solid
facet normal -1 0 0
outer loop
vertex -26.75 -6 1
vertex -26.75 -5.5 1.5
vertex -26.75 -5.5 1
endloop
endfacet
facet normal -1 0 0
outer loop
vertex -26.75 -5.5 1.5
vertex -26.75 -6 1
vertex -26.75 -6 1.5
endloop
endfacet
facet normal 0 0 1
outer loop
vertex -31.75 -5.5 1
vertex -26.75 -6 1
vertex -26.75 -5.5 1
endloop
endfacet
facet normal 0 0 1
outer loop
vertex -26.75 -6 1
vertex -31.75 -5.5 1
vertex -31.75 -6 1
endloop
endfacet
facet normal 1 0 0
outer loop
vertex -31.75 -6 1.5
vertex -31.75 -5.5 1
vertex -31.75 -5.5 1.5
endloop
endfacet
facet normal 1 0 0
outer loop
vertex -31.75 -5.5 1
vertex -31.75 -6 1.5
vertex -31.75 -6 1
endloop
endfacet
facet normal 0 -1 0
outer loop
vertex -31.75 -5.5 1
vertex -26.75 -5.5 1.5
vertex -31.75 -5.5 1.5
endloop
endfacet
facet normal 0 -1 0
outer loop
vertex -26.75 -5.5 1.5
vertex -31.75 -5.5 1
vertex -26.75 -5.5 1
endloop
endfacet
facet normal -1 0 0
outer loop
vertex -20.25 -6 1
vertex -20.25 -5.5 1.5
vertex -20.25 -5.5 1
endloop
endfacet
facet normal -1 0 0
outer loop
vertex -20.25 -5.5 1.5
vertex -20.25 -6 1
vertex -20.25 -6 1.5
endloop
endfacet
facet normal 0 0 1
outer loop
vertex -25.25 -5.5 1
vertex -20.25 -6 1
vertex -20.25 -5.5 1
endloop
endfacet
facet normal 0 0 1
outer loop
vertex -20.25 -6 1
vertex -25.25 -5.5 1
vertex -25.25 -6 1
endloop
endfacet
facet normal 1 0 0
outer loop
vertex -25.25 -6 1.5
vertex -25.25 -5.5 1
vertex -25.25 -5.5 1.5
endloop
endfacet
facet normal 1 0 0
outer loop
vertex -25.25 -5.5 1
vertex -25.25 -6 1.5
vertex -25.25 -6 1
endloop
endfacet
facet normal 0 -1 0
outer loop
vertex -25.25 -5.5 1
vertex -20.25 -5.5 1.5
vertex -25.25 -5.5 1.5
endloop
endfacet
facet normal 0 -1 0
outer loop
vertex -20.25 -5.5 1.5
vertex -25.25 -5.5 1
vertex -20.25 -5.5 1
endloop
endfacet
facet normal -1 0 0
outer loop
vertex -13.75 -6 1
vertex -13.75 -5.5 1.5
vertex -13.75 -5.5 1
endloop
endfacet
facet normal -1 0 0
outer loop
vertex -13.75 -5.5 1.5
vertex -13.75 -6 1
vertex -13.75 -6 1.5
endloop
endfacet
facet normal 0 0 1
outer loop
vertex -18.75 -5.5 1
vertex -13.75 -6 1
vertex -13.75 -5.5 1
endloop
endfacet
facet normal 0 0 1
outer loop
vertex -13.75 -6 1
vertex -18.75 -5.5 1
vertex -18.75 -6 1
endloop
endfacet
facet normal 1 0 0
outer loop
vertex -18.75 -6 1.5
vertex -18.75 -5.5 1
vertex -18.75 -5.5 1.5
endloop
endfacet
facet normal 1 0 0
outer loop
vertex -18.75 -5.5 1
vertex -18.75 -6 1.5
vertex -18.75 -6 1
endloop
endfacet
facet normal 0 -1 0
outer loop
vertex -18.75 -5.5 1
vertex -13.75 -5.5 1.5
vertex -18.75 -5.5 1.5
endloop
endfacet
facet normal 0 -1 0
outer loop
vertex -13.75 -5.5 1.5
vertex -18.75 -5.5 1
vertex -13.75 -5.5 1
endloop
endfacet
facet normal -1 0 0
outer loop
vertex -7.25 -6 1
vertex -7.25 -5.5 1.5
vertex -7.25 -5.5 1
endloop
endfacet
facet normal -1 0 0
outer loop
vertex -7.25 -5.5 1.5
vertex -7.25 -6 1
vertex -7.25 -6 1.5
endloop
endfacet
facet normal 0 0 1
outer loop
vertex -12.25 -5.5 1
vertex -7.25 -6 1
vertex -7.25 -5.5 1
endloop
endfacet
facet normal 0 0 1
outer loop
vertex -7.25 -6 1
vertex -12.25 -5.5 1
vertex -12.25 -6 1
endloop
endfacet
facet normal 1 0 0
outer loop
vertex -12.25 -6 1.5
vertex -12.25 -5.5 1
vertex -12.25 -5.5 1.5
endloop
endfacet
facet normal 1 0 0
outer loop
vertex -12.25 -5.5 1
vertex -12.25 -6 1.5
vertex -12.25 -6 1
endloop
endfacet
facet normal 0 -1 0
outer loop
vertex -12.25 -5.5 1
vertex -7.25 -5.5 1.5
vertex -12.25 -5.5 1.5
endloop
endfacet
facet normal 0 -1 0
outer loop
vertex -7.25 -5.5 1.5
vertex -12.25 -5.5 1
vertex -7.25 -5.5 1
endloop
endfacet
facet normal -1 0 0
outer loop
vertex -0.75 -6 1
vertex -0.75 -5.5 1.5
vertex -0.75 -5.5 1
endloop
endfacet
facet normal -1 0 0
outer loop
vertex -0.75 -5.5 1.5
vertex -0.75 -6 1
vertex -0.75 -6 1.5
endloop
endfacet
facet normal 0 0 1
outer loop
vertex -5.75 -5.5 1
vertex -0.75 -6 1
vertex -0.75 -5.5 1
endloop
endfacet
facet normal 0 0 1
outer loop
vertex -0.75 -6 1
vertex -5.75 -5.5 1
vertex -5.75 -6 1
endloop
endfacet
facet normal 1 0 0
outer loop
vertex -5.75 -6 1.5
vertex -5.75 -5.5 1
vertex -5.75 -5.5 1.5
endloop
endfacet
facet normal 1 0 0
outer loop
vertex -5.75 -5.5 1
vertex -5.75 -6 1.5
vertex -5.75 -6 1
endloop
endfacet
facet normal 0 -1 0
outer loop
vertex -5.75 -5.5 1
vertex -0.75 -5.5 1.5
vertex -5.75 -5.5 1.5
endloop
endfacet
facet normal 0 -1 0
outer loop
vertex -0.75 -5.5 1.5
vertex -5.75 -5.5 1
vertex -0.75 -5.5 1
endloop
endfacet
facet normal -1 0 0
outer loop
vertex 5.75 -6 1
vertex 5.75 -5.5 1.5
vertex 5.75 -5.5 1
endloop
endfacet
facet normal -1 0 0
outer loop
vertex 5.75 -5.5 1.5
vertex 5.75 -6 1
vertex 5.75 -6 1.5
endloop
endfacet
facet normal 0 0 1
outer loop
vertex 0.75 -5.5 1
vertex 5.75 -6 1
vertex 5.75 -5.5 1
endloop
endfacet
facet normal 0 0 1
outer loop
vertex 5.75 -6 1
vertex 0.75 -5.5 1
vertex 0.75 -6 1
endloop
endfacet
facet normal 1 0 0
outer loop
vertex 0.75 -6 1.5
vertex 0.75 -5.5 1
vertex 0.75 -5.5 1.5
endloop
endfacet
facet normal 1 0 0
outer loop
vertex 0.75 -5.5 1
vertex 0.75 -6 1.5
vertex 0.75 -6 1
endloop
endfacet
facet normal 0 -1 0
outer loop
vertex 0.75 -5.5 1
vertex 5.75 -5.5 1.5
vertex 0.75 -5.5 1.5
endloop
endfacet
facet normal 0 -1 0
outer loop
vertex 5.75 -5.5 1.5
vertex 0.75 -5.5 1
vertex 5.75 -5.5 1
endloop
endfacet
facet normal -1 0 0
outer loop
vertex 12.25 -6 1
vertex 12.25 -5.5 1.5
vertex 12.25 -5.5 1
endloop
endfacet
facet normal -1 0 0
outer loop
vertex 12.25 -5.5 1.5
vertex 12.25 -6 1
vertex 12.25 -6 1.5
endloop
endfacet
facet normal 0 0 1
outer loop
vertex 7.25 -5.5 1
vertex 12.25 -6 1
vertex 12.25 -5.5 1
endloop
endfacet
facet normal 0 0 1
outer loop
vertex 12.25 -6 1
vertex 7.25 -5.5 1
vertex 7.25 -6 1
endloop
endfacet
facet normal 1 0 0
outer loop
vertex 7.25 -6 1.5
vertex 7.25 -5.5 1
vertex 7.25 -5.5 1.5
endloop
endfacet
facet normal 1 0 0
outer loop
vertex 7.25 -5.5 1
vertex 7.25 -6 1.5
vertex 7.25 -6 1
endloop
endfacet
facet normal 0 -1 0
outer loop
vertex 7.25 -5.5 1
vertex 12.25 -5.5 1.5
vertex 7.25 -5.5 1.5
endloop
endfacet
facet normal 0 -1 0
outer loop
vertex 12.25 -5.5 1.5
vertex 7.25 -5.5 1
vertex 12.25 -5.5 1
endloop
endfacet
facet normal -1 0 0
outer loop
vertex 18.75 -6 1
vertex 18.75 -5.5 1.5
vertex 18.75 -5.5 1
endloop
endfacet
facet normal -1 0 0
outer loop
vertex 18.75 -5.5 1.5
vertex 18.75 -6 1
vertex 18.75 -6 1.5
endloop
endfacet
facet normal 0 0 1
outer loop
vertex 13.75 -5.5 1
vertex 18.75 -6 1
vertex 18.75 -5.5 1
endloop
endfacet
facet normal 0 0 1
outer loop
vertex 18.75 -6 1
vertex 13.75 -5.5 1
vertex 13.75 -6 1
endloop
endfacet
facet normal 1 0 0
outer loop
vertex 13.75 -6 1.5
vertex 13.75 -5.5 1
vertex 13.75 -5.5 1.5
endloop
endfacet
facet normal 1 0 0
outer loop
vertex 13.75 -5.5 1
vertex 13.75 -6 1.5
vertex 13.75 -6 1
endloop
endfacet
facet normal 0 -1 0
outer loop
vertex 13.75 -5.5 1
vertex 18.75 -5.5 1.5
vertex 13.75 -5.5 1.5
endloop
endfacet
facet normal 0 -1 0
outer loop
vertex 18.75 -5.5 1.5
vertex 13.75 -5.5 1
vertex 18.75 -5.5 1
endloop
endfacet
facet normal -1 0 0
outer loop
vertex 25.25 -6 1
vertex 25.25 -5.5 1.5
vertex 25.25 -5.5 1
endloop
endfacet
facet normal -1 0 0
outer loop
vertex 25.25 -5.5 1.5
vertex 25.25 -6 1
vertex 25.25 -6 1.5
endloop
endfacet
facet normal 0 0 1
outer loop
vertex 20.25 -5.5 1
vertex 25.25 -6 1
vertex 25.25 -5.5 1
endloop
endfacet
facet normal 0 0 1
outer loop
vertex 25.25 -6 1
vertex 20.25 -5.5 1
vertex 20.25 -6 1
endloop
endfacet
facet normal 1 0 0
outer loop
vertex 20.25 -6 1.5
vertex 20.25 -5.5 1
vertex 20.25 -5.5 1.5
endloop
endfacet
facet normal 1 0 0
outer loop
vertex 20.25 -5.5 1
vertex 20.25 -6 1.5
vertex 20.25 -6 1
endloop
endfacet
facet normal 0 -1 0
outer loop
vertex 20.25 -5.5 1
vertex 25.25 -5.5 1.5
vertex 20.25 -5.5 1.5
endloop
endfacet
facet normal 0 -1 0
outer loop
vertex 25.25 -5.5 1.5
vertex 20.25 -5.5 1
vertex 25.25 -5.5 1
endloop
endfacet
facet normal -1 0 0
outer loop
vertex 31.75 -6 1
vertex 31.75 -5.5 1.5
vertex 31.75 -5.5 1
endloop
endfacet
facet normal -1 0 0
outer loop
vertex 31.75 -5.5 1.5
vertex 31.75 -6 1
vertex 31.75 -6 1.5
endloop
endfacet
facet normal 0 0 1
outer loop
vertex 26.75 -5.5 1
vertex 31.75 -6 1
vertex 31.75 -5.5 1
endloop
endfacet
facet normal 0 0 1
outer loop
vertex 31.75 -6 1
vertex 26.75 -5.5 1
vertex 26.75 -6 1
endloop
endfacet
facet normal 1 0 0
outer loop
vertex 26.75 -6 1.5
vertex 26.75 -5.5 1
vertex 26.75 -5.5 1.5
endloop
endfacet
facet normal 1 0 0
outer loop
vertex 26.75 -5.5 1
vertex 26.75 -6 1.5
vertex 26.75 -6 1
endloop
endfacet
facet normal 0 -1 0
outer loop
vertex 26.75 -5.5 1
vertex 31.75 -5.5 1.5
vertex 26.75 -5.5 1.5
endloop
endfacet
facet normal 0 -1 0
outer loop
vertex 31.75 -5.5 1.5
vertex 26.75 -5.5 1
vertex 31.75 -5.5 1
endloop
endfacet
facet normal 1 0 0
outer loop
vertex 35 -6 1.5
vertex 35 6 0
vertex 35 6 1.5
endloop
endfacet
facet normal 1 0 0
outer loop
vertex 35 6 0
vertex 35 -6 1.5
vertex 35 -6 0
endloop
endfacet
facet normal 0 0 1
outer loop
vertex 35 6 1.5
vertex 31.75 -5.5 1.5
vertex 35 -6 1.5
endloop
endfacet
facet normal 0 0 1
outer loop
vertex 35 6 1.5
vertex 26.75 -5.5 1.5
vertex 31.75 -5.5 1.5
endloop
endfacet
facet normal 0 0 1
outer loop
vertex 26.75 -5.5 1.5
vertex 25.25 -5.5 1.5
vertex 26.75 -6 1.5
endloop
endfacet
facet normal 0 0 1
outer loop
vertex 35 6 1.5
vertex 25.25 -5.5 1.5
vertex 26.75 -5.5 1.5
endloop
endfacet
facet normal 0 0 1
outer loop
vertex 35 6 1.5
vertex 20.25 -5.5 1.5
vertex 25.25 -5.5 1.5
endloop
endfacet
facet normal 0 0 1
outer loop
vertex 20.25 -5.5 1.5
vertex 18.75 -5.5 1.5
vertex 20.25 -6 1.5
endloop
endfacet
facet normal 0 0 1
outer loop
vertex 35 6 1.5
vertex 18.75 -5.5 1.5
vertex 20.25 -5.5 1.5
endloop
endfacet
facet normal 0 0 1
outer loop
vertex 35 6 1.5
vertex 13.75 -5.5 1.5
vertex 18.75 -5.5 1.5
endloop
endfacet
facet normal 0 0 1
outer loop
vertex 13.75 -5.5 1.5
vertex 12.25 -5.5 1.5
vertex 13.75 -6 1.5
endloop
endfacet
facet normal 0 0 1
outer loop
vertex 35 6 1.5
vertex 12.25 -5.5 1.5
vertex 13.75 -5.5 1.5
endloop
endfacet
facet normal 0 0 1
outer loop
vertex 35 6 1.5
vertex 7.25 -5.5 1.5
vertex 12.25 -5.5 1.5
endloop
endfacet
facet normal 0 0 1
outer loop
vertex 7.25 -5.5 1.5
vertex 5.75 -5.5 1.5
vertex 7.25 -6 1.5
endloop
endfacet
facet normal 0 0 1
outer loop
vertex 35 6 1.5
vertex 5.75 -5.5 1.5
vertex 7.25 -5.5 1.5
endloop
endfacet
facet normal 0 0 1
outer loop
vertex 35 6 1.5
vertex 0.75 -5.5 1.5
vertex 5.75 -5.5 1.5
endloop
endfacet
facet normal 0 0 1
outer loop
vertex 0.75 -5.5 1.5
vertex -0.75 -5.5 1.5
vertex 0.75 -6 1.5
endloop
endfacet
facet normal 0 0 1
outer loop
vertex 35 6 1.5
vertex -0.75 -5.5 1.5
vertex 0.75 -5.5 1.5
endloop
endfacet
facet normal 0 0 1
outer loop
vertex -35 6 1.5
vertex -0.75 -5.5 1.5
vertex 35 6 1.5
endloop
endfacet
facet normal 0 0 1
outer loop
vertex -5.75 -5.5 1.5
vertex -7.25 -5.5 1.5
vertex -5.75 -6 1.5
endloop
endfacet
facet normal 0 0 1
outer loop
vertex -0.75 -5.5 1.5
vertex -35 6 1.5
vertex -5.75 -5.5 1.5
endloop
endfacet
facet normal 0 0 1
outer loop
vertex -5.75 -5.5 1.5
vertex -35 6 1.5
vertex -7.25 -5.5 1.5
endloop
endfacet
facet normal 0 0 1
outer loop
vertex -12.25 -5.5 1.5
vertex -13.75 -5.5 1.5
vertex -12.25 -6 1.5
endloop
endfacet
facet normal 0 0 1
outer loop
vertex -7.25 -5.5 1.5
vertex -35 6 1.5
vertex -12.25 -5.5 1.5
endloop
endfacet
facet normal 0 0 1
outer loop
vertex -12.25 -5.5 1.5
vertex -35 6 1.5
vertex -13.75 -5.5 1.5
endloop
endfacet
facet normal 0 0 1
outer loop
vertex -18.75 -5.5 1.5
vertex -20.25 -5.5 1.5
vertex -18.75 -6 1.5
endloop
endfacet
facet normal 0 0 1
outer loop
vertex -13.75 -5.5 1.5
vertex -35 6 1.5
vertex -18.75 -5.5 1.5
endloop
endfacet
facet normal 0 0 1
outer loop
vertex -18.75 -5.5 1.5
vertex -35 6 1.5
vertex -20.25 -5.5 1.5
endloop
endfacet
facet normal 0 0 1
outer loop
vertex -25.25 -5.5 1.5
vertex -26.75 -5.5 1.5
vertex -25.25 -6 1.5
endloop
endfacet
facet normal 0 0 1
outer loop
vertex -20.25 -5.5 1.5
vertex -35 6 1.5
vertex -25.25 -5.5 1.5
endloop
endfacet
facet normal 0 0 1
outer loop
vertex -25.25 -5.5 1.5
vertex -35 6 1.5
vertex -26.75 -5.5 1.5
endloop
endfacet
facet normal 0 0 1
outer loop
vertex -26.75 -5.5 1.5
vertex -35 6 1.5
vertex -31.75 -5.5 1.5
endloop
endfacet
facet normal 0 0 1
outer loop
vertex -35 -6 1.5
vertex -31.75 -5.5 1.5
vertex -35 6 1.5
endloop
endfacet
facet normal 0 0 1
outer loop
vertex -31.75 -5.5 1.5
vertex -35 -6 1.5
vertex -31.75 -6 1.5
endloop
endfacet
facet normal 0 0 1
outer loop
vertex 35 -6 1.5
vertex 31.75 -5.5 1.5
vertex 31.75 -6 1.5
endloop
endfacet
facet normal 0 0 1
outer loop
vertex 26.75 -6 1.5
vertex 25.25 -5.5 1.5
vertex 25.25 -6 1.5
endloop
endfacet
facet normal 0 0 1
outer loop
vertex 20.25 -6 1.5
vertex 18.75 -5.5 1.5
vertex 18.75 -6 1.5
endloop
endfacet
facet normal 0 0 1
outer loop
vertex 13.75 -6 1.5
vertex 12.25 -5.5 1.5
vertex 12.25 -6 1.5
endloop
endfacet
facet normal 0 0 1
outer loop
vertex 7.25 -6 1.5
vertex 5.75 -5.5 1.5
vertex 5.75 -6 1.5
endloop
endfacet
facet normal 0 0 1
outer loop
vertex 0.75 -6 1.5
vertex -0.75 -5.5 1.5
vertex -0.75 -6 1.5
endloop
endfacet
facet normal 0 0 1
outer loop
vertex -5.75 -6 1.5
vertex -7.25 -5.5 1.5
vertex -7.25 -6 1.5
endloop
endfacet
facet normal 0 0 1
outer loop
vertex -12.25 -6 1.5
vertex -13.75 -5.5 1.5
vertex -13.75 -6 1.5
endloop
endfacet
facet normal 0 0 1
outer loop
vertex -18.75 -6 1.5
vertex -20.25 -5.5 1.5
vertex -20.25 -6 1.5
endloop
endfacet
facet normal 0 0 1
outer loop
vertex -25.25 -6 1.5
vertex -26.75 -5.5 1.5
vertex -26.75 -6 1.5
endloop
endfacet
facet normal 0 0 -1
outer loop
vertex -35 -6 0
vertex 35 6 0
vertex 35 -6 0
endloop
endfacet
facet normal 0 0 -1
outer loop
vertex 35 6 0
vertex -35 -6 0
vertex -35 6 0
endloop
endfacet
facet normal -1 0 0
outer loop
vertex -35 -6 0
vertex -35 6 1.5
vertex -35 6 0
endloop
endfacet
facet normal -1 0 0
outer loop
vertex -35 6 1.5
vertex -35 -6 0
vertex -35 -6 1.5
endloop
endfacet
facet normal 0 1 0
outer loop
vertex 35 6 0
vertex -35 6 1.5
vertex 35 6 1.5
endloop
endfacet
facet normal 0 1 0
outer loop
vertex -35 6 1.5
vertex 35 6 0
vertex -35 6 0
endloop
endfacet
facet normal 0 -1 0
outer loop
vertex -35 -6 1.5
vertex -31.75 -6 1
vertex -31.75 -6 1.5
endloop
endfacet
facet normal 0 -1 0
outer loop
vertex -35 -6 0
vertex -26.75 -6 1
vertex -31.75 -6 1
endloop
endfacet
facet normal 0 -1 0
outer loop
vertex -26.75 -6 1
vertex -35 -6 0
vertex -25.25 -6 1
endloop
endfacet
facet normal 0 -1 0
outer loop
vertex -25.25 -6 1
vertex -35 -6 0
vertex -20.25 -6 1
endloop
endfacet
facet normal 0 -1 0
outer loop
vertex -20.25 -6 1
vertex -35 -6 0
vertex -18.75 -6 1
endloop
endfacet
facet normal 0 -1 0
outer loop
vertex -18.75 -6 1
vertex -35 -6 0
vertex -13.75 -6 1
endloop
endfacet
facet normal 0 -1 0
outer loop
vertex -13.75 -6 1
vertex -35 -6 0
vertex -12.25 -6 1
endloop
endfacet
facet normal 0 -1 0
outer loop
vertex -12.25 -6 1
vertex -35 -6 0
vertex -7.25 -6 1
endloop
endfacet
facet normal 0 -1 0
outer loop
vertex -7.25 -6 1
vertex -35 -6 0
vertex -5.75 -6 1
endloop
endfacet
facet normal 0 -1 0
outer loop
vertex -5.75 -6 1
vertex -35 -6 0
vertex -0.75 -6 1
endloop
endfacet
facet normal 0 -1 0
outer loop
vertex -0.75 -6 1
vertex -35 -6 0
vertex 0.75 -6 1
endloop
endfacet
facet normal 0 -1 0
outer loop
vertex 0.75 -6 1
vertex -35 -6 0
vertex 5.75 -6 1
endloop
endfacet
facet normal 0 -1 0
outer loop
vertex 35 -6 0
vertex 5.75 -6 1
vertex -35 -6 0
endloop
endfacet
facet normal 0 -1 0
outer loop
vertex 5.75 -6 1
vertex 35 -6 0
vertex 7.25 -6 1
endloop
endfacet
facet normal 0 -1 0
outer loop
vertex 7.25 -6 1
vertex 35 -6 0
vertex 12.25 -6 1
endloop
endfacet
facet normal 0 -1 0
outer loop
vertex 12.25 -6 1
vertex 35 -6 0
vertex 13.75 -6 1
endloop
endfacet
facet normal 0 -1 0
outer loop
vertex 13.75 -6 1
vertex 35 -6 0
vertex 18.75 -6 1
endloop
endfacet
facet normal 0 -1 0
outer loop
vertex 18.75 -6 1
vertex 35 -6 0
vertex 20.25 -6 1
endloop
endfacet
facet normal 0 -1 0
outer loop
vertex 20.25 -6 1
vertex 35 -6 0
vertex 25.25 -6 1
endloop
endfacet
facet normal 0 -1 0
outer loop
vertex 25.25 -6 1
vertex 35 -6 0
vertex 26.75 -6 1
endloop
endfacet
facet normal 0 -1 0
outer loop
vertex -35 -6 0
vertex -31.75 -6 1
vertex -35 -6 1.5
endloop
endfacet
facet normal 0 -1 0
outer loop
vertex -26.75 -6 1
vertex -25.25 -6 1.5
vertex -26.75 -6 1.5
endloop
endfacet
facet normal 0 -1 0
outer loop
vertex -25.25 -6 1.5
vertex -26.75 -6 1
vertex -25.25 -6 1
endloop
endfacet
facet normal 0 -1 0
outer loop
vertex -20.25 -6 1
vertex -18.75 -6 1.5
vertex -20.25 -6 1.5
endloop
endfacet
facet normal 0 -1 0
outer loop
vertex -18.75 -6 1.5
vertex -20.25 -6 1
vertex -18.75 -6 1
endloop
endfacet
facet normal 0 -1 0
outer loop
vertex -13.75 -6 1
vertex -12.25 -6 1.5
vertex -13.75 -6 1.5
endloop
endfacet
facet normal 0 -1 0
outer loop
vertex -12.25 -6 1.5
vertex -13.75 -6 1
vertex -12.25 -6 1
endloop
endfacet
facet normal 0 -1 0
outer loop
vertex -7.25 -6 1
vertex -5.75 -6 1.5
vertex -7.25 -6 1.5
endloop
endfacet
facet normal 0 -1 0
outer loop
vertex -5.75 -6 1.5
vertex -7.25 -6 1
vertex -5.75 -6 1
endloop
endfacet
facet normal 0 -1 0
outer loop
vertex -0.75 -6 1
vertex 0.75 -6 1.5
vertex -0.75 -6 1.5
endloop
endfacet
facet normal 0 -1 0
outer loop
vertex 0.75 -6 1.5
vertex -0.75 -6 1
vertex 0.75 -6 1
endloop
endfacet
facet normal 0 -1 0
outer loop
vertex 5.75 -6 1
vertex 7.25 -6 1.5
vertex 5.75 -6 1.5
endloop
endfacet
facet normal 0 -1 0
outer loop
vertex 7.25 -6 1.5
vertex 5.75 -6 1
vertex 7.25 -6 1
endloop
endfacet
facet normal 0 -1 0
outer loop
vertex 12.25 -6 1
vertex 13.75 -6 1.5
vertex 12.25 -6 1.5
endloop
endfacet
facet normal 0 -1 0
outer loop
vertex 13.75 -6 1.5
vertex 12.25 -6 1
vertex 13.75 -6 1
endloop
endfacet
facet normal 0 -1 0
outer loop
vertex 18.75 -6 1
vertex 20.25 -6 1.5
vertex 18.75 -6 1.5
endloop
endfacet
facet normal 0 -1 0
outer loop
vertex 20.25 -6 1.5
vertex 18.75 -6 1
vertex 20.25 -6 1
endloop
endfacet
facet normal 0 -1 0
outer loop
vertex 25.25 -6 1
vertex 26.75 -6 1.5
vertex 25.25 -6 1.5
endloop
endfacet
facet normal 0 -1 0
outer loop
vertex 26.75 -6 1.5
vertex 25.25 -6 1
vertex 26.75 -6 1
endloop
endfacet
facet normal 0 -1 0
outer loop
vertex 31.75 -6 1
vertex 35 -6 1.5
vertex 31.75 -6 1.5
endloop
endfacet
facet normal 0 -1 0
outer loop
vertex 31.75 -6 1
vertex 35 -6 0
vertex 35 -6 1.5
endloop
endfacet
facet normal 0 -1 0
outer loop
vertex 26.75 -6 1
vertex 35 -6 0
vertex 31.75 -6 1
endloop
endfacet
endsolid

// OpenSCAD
// 10-well comb for casting agarose gels
// Print orientation: flat on bed, spine (back bar) along +X, teeth hanging in -Y

// ---------- Parameters ----------
plate_t      = 1.5;    // plate thickness (Z)
spine_l      = 70;     // spine length (X)
spine_w      = 12;     // spine width (Y)
tooth_n      = 10;     // number of teeth
tooth_w      = 5.0;    // tooth width (X)
tooth_len    = 12;     // tooth length (Y)
tooth_gap    = 1.5;    // gap between neighbouring teeth (X)
eps          = 0.5;    // cutter overshoot past faces (Z)

$fn = 64;

// ---------- Derived ----------
pitch   = tooth_w + tooth_gap;            // centre-to-centre tooth spacing
x0      = -(tooth_n - 1) * pitch / 2;     // first tooth centre (row centred on spine)
tooth_h = tooth_len + eps;                // cutter height from top face

// ---------- Model ----------
difference() {
    // Base plate
    translate([-spine_l / 2, -spine_w / 2, 0])
        cube([spine_l, spine_w, plate_t]);

    // Teeth cutters (through the top face)
    for (i = [0 : tooth_n - 1])
        translate([x0 + i * pitch - tooth_w / 2,
                   -spine_w / 2 - tooth_len,
                   plate_t - eps])
            cube([tooth_w, tooth_len + eps, tooth_h]);
}
